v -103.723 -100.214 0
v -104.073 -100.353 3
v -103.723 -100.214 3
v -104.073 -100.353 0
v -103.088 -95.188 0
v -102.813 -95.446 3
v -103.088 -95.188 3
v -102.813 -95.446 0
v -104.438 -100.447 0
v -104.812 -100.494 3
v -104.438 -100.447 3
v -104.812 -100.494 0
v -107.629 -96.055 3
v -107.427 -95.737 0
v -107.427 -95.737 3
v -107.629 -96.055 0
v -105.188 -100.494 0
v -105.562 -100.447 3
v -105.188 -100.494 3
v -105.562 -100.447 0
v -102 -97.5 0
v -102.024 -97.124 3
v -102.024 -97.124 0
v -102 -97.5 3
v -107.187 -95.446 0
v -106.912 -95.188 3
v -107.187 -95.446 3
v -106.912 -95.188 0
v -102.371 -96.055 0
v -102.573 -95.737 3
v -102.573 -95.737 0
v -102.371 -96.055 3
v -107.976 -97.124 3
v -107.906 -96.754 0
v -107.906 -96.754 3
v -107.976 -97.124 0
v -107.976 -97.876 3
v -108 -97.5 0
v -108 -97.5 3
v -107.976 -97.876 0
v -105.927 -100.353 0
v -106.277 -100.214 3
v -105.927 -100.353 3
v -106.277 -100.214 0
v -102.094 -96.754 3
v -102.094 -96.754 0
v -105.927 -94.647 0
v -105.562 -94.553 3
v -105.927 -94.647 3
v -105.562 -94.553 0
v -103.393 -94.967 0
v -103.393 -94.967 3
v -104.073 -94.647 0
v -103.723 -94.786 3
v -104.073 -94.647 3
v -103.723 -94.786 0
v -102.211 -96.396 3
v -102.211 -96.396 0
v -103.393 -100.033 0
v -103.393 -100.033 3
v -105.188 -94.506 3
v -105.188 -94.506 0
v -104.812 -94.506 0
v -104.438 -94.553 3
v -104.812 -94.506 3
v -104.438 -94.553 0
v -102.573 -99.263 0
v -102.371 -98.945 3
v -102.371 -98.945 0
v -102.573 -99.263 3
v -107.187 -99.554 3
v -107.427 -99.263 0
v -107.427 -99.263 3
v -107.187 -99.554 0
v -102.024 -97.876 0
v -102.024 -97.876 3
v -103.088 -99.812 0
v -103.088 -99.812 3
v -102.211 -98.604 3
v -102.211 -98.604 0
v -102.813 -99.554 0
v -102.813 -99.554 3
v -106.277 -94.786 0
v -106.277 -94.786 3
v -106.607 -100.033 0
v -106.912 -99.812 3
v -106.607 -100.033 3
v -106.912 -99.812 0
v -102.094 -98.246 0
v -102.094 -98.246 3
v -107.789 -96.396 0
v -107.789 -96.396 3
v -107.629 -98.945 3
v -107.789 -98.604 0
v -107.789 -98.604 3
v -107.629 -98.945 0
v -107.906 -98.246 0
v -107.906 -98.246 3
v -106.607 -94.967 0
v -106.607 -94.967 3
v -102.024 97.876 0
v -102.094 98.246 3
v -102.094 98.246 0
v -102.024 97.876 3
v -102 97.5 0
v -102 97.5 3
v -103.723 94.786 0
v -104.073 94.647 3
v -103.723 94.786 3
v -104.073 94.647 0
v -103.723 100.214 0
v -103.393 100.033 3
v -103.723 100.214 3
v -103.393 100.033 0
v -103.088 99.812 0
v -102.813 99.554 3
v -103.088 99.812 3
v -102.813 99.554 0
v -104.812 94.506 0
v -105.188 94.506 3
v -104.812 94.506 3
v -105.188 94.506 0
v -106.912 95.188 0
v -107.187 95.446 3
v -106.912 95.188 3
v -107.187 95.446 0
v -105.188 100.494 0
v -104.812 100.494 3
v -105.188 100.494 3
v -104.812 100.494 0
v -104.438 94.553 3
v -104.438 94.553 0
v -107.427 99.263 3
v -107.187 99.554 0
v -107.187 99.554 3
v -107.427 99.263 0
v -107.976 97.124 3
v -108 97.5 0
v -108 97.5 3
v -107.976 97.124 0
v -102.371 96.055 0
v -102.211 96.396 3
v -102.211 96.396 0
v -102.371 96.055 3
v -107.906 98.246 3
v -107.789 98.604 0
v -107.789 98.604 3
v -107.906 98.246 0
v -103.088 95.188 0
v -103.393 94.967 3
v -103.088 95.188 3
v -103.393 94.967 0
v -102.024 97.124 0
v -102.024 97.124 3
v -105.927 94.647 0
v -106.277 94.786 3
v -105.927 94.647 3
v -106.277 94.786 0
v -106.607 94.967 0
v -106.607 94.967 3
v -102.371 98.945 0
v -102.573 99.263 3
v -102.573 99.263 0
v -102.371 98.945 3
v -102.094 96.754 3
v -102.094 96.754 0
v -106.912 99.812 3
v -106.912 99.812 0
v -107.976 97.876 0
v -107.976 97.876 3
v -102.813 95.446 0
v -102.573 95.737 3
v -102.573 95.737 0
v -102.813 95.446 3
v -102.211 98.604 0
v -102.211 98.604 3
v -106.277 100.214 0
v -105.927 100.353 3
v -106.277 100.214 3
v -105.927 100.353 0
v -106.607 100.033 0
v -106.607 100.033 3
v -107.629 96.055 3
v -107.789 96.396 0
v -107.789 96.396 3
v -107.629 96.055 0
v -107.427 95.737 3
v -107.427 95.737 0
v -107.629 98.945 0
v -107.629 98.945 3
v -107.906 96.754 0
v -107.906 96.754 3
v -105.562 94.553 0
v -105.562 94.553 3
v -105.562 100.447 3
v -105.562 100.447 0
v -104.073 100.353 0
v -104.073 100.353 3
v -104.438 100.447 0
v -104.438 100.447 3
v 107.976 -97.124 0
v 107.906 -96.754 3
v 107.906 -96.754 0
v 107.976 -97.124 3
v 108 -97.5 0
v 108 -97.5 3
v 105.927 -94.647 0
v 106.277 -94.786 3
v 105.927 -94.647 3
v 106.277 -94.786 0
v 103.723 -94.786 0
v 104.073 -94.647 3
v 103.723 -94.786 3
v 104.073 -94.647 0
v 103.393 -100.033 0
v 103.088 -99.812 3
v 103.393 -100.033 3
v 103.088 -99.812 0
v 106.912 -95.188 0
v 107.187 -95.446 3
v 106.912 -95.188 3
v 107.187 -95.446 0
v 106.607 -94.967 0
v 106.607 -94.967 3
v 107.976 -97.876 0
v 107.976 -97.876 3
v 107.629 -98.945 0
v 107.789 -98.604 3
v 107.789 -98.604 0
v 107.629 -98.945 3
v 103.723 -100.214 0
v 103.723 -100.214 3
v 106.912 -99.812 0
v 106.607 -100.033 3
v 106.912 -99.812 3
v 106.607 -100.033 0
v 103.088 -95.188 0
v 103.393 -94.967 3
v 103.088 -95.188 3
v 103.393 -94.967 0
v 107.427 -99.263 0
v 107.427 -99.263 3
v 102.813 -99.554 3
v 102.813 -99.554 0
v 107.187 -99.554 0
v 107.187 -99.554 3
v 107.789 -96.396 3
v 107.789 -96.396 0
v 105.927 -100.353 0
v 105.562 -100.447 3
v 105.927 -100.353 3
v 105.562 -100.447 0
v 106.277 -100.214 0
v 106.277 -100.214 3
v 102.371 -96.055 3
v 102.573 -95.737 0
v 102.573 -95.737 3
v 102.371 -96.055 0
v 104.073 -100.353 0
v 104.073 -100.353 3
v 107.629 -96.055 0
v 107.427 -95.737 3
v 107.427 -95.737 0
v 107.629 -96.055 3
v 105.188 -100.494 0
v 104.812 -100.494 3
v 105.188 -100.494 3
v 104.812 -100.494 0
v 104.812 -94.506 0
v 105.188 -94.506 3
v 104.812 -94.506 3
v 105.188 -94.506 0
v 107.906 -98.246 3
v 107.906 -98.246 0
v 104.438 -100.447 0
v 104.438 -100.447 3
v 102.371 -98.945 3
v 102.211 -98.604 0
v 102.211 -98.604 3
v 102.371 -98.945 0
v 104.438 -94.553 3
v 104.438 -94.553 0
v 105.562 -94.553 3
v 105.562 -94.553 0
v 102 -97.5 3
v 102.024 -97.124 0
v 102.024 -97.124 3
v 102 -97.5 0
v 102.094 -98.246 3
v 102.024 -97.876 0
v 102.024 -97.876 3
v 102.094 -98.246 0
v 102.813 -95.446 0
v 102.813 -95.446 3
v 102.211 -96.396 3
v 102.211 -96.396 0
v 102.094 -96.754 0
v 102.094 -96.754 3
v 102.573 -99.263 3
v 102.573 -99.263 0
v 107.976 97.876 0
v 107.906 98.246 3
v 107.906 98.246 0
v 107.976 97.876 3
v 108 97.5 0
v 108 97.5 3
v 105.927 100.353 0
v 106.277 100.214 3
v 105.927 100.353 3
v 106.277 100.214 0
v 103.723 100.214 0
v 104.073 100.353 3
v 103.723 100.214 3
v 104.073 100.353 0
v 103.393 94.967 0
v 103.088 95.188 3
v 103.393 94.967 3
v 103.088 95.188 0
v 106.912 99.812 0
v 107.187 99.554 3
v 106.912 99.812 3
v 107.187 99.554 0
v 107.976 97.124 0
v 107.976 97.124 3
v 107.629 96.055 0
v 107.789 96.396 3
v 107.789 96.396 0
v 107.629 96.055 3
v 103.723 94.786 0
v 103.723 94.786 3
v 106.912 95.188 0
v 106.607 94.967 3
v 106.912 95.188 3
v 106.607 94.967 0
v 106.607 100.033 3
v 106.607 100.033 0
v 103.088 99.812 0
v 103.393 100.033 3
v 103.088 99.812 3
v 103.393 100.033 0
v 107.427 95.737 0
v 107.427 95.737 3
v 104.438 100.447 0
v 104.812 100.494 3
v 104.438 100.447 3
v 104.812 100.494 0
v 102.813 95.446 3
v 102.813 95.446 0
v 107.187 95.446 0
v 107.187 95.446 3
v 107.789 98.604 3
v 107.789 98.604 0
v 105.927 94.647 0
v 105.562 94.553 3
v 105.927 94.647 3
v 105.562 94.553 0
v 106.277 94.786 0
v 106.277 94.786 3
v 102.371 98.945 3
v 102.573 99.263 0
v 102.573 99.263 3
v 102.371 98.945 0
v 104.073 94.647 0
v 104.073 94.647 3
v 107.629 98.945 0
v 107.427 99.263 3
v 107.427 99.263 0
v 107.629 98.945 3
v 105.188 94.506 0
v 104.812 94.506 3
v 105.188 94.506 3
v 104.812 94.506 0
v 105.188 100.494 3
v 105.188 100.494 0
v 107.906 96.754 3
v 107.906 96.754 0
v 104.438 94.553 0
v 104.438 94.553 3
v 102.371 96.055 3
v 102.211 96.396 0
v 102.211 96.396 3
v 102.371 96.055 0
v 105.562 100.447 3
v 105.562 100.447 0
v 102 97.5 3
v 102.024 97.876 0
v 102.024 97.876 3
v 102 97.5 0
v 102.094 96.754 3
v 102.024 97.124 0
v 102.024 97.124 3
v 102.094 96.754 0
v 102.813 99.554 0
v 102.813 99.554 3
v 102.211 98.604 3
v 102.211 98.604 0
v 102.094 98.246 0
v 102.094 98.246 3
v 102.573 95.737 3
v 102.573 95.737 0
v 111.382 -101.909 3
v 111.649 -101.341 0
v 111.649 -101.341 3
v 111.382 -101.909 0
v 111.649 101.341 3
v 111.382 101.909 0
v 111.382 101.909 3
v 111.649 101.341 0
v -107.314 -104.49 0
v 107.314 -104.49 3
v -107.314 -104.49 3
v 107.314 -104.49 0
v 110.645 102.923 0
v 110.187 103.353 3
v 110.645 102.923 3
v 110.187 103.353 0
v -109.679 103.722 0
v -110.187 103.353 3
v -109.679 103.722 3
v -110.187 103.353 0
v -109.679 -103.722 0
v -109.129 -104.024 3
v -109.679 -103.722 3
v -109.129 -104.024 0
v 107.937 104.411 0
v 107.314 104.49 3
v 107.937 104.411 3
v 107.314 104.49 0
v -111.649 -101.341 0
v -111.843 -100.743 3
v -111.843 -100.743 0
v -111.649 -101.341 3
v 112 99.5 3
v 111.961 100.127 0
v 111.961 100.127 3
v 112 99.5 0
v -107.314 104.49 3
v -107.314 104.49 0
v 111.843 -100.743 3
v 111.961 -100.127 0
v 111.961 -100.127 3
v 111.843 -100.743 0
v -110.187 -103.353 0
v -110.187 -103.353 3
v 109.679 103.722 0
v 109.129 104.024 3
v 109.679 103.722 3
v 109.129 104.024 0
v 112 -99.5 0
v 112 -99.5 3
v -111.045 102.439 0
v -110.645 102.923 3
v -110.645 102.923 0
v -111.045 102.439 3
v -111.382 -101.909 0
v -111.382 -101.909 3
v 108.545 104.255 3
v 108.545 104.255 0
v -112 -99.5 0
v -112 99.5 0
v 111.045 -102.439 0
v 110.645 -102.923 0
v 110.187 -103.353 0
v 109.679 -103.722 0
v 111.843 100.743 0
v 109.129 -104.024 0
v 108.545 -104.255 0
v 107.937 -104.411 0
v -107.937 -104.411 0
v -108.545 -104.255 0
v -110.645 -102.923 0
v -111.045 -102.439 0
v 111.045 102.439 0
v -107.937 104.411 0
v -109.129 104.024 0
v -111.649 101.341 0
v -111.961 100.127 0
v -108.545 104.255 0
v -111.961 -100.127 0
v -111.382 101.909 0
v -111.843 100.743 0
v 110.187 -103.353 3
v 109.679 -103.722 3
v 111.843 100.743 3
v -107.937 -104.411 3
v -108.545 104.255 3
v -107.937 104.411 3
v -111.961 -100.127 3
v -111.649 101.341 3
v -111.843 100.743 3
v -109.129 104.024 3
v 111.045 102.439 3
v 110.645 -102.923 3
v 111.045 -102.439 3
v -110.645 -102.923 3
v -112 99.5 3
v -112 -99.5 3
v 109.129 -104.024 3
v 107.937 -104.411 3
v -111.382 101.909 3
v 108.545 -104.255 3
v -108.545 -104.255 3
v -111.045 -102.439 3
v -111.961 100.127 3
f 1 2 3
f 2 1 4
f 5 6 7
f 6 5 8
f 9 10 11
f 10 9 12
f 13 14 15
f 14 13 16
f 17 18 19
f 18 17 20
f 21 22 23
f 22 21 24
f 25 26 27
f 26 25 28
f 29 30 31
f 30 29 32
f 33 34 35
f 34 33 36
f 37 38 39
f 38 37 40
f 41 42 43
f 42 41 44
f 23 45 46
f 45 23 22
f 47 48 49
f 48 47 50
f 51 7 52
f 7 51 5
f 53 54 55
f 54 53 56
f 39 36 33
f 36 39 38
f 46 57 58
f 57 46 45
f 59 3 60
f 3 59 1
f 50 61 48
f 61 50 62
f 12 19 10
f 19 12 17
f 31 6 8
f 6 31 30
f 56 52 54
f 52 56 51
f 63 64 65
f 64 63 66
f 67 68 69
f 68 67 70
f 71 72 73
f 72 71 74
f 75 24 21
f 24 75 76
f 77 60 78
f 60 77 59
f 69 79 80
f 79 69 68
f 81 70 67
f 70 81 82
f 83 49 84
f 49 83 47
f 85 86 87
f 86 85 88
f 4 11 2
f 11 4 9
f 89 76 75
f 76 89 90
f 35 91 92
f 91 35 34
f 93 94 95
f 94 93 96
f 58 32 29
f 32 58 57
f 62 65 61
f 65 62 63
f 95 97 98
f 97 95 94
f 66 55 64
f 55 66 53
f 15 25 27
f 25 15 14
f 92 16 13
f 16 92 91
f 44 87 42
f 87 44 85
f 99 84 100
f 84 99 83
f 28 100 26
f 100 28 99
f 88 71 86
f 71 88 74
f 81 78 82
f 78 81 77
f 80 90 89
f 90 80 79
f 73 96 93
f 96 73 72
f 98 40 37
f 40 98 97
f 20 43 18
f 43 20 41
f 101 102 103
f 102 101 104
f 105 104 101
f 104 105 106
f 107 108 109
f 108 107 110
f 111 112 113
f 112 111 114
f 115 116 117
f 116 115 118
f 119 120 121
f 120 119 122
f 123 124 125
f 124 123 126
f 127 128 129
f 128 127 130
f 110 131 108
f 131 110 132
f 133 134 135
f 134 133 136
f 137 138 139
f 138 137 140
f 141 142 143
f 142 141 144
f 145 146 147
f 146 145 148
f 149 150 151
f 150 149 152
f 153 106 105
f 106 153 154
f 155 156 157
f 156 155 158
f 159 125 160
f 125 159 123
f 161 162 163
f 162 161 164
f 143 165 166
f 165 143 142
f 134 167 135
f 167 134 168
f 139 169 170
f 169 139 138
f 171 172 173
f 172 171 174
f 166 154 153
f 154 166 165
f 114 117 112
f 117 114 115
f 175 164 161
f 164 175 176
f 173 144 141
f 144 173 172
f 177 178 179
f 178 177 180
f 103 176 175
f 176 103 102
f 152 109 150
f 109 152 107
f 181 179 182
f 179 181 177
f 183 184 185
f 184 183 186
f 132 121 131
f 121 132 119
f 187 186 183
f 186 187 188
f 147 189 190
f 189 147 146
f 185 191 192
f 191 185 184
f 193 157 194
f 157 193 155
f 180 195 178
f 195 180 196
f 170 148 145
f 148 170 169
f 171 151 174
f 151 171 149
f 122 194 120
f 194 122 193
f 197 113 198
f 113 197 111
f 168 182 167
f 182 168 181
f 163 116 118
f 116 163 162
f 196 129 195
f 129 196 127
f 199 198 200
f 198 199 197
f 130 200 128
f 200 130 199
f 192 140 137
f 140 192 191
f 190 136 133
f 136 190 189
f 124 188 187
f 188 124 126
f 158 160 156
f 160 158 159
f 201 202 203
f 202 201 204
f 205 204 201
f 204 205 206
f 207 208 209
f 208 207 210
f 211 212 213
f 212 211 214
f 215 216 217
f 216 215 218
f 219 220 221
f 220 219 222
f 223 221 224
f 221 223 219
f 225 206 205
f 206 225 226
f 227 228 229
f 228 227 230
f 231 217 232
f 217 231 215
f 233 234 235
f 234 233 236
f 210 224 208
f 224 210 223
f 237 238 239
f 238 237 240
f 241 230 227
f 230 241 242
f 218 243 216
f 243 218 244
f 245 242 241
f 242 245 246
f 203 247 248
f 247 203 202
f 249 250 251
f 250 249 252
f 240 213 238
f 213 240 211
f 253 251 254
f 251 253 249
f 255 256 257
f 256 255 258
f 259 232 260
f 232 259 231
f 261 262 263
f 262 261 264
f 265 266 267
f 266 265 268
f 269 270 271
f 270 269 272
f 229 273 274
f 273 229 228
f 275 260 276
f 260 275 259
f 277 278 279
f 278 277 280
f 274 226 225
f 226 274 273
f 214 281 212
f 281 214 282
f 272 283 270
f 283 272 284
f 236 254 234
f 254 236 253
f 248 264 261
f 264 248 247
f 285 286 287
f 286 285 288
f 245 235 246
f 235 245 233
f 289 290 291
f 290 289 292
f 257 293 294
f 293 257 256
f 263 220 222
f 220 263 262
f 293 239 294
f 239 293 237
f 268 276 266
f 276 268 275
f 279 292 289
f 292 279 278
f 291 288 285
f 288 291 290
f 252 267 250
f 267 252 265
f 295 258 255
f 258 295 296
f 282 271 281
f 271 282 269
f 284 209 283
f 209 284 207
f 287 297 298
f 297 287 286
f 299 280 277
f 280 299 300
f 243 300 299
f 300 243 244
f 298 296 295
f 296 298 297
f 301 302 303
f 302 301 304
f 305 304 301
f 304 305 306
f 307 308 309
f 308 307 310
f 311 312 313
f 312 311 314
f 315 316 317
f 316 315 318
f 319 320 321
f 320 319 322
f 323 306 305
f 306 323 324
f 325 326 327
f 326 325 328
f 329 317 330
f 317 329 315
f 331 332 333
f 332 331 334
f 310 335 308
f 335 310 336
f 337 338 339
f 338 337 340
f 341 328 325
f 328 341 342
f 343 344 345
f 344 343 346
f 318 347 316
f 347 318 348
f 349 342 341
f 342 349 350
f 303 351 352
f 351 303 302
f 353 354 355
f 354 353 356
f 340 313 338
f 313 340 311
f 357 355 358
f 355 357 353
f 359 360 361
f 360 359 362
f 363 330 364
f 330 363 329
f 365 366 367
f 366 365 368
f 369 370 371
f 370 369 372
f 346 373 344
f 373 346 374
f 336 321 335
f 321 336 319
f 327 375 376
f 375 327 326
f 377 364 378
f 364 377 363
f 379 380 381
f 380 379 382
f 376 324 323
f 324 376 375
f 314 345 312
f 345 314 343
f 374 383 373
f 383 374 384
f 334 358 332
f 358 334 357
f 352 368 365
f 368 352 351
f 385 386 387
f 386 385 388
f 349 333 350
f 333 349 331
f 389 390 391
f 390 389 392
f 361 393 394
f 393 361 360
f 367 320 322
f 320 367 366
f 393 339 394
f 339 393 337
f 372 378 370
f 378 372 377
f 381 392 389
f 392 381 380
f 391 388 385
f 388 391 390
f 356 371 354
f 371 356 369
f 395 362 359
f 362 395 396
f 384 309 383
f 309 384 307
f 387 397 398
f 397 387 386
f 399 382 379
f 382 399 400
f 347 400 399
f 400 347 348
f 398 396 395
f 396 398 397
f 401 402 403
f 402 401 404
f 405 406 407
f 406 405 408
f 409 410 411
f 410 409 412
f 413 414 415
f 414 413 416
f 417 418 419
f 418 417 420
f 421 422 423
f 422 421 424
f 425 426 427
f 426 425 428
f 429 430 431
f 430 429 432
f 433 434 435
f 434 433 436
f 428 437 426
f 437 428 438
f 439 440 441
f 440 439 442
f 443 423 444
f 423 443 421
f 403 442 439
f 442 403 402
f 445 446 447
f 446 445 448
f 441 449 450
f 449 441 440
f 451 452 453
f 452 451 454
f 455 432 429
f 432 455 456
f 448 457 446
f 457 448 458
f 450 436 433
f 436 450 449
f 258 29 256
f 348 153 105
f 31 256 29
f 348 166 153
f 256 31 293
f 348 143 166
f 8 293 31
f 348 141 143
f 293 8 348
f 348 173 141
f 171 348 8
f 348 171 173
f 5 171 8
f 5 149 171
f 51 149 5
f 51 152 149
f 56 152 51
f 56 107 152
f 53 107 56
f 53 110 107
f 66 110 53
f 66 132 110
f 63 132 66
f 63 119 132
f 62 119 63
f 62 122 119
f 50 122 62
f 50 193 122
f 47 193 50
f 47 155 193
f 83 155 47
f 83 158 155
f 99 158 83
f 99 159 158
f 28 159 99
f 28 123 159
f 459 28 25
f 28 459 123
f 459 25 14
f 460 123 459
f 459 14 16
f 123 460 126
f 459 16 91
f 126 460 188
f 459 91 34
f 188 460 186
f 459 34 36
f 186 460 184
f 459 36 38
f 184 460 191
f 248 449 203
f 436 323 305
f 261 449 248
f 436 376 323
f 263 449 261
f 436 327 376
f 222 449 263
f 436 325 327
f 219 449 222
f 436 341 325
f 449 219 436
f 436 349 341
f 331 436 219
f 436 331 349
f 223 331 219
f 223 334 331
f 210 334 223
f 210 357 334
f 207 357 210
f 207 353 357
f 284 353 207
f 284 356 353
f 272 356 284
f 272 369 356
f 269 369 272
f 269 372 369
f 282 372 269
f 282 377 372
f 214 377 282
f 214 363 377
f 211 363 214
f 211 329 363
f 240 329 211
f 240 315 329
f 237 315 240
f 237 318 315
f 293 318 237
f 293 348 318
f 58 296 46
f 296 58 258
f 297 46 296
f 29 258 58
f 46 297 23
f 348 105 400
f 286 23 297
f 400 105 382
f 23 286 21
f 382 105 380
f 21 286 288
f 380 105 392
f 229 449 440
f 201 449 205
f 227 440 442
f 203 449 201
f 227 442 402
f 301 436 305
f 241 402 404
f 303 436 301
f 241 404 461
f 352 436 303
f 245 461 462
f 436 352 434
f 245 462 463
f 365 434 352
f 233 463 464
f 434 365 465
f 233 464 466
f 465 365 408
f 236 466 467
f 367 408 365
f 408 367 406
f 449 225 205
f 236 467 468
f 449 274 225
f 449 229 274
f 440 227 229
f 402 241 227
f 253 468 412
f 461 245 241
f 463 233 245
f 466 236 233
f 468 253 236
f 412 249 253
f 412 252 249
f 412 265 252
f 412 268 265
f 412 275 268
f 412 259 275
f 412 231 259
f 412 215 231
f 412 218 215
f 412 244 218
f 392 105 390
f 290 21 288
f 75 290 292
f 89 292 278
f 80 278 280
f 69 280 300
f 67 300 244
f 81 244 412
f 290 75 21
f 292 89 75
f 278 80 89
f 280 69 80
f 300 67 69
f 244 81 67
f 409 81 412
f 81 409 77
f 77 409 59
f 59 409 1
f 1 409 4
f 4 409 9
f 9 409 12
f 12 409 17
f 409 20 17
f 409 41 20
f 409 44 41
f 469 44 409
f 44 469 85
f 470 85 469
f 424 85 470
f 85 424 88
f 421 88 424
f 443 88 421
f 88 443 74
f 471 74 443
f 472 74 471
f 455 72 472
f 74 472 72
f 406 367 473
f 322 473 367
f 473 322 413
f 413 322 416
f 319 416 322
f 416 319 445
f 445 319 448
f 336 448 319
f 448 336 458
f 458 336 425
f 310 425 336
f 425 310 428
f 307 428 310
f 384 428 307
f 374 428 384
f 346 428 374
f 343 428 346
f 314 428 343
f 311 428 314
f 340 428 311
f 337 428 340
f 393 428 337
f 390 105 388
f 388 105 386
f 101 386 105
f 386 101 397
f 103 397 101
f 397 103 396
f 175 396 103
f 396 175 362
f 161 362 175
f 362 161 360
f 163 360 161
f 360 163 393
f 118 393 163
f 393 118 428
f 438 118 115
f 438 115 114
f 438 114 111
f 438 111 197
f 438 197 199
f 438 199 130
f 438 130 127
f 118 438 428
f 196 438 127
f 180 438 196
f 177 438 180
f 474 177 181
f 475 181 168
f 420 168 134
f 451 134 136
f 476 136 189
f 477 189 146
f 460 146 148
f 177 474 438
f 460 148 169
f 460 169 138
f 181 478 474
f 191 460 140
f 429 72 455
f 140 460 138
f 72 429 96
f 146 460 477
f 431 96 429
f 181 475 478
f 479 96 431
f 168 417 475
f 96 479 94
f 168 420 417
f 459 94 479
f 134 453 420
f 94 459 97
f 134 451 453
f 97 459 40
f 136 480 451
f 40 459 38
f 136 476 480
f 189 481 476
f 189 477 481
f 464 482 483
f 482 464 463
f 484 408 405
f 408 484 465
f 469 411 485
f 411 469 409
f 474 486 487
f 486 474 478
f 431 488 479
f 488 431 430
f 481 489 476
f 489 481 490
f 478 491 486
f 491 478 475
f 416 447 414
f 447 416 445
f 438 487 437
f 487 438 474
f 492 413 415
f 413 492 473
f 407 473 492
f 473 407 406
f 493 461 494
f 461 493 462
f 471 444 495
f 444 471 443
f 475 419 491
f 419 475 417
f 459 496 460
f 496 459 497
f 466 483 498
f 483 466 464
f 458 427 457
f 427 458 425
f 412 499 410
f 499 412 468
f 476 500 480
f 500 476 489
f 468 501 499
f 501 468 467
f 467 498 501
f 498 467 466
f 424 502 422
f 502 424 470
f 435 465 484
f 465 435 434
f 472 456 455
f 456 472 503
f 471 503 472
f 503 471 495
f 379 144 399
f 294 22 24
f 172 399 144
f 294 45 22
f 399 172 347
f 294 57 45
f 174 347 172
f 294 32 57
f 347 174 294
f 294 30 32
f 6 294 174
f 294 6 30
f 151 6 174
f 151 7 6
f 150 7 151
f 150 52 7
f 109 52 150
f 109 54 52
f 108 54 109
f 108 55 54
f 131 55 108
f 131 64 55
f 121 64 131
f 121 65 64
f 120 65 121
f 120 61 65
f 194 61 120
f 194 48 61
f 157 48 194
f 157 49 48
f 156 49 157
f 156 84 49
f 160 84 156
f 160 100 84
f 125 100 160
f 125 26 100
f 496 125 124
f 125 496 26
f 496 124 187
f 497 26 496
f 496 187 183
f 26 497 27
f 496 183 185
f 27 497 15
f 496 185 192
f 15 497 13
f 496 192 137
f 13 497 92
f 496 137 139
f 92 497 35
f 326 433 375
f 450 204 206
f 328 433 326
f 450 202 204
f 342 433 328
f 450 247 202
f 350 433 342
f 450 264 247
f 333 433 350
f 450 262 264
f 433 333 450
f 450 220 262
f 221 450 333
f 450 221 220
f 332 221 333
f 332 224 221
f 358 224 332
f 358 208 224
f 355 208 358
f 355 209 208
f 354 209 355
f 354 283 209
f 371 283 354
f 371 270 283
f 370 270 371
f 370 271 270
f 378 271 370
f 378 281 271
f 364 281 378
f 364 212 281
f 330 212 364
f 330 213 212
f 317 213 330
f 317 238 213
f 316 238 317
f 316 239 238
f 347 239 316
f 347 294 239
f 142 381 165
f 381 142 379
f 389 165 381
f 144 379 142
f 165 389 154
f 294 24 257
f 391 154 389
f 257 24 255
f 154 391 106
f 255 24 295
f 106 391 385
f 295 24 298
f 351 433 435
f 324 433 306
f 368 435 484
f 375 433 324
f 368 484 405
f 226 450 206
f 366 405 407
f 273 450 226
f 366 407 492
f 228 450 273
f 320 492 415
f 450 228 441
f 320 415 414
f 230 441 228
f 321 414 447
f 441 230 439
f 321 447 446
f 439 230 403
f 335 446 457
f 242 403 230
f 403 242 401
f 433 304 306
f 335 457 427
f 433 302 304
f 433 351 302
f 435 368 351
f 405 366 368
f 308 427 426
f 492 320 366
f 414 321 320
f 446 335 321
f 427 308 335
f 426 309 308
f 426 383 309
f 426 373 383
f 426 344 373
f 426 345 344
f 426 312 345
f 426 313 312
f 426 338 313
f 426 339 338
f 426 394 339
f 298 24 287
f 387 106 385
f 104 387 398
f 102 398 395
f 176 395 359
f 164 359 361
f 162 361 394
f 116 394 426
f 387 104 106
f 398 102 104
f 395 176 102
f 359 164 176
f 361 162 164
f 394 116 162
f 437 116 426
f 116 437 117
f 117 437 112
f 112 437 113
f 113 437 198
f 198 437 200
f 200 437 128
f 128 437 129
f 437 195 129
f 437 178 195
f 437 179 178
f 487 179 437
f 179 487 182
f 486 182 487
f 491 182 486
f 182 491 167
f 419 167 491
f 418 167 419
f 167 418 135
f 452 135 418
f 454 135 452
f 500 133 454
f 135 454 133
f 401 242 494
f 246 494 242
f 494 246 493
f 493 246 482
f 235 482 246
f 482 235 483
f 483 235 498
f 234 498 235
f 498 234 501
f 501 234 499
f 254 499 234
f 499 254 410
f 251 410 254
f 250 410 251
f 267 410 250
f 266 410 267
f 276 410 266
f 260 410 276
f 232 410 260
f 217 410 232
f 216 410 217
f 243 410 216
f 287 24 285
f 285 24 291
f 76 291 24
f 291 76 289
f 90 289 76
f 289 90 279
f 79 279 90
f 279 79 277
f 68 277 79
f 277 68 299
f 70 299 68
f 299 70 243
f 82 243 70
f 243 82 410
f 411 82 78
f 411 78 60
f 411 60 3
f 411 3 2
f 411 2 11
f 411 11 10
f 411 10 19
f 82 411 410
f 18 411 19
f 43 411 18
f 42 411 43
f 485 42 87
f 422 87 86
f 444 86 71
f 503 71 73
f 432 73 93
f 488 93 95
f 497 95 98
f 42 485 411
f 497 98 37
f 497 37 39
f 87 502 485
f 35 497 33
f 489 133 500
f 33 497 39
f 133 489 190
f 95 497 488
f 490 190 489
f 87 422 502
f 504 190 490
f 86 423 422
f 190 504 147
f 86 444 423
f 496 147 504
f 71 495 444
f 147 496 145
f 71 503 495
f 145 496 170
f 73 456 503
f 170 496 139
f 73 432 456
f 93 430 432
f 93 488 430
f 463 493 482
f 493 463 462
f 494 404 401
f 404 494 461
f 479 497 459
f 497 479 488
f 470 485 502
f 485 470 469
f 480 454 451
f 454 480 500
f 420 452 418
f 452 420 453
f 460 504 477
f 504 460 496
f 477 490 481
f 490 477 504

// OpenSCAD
$fn = 50;


difference() {
	union() {
		hull() {
			translate(v = [-107.0000000000, 99.5000000000, 0]) {
				cylinder(h = 3, r = 5);
			}
			translate(v = [107.0000000000, 99.5000000000, 0]) {
				cylinder(h = 3, r = 5);
			}
			translate(v = [-107.0000000000, -99.5000000000, 0]) {
				cylinder(h = 3, r = 5);
			}
			translate(v = [107.0000000000, -99.5000000000, 0]) {
				cylinder(h = 3, r = 5);
			}
		}
	}
	union() {
		translate(v = [-105.0000000000, -97.5000000000, -100.0000000000]) {
			cylinder(h = 200, r = 3.0000000000);
		}
		translate(v = [-105.0000000000, 97.5000000000, -100.0000000000]) {
			cylinder(h = 200, r = 3.0000000000);
		}
		translate(v = [105.0000000000, -97.5000000000, -100.0000000000]) {
			cylinder(h = 200, r = 3.0000000000);
		}
		translate(v = [105.0000000000, 97.5000000000, -100.0000000000]) {
			cylinder(h = 200, r = 3.0000000000);
		}
	}
}
